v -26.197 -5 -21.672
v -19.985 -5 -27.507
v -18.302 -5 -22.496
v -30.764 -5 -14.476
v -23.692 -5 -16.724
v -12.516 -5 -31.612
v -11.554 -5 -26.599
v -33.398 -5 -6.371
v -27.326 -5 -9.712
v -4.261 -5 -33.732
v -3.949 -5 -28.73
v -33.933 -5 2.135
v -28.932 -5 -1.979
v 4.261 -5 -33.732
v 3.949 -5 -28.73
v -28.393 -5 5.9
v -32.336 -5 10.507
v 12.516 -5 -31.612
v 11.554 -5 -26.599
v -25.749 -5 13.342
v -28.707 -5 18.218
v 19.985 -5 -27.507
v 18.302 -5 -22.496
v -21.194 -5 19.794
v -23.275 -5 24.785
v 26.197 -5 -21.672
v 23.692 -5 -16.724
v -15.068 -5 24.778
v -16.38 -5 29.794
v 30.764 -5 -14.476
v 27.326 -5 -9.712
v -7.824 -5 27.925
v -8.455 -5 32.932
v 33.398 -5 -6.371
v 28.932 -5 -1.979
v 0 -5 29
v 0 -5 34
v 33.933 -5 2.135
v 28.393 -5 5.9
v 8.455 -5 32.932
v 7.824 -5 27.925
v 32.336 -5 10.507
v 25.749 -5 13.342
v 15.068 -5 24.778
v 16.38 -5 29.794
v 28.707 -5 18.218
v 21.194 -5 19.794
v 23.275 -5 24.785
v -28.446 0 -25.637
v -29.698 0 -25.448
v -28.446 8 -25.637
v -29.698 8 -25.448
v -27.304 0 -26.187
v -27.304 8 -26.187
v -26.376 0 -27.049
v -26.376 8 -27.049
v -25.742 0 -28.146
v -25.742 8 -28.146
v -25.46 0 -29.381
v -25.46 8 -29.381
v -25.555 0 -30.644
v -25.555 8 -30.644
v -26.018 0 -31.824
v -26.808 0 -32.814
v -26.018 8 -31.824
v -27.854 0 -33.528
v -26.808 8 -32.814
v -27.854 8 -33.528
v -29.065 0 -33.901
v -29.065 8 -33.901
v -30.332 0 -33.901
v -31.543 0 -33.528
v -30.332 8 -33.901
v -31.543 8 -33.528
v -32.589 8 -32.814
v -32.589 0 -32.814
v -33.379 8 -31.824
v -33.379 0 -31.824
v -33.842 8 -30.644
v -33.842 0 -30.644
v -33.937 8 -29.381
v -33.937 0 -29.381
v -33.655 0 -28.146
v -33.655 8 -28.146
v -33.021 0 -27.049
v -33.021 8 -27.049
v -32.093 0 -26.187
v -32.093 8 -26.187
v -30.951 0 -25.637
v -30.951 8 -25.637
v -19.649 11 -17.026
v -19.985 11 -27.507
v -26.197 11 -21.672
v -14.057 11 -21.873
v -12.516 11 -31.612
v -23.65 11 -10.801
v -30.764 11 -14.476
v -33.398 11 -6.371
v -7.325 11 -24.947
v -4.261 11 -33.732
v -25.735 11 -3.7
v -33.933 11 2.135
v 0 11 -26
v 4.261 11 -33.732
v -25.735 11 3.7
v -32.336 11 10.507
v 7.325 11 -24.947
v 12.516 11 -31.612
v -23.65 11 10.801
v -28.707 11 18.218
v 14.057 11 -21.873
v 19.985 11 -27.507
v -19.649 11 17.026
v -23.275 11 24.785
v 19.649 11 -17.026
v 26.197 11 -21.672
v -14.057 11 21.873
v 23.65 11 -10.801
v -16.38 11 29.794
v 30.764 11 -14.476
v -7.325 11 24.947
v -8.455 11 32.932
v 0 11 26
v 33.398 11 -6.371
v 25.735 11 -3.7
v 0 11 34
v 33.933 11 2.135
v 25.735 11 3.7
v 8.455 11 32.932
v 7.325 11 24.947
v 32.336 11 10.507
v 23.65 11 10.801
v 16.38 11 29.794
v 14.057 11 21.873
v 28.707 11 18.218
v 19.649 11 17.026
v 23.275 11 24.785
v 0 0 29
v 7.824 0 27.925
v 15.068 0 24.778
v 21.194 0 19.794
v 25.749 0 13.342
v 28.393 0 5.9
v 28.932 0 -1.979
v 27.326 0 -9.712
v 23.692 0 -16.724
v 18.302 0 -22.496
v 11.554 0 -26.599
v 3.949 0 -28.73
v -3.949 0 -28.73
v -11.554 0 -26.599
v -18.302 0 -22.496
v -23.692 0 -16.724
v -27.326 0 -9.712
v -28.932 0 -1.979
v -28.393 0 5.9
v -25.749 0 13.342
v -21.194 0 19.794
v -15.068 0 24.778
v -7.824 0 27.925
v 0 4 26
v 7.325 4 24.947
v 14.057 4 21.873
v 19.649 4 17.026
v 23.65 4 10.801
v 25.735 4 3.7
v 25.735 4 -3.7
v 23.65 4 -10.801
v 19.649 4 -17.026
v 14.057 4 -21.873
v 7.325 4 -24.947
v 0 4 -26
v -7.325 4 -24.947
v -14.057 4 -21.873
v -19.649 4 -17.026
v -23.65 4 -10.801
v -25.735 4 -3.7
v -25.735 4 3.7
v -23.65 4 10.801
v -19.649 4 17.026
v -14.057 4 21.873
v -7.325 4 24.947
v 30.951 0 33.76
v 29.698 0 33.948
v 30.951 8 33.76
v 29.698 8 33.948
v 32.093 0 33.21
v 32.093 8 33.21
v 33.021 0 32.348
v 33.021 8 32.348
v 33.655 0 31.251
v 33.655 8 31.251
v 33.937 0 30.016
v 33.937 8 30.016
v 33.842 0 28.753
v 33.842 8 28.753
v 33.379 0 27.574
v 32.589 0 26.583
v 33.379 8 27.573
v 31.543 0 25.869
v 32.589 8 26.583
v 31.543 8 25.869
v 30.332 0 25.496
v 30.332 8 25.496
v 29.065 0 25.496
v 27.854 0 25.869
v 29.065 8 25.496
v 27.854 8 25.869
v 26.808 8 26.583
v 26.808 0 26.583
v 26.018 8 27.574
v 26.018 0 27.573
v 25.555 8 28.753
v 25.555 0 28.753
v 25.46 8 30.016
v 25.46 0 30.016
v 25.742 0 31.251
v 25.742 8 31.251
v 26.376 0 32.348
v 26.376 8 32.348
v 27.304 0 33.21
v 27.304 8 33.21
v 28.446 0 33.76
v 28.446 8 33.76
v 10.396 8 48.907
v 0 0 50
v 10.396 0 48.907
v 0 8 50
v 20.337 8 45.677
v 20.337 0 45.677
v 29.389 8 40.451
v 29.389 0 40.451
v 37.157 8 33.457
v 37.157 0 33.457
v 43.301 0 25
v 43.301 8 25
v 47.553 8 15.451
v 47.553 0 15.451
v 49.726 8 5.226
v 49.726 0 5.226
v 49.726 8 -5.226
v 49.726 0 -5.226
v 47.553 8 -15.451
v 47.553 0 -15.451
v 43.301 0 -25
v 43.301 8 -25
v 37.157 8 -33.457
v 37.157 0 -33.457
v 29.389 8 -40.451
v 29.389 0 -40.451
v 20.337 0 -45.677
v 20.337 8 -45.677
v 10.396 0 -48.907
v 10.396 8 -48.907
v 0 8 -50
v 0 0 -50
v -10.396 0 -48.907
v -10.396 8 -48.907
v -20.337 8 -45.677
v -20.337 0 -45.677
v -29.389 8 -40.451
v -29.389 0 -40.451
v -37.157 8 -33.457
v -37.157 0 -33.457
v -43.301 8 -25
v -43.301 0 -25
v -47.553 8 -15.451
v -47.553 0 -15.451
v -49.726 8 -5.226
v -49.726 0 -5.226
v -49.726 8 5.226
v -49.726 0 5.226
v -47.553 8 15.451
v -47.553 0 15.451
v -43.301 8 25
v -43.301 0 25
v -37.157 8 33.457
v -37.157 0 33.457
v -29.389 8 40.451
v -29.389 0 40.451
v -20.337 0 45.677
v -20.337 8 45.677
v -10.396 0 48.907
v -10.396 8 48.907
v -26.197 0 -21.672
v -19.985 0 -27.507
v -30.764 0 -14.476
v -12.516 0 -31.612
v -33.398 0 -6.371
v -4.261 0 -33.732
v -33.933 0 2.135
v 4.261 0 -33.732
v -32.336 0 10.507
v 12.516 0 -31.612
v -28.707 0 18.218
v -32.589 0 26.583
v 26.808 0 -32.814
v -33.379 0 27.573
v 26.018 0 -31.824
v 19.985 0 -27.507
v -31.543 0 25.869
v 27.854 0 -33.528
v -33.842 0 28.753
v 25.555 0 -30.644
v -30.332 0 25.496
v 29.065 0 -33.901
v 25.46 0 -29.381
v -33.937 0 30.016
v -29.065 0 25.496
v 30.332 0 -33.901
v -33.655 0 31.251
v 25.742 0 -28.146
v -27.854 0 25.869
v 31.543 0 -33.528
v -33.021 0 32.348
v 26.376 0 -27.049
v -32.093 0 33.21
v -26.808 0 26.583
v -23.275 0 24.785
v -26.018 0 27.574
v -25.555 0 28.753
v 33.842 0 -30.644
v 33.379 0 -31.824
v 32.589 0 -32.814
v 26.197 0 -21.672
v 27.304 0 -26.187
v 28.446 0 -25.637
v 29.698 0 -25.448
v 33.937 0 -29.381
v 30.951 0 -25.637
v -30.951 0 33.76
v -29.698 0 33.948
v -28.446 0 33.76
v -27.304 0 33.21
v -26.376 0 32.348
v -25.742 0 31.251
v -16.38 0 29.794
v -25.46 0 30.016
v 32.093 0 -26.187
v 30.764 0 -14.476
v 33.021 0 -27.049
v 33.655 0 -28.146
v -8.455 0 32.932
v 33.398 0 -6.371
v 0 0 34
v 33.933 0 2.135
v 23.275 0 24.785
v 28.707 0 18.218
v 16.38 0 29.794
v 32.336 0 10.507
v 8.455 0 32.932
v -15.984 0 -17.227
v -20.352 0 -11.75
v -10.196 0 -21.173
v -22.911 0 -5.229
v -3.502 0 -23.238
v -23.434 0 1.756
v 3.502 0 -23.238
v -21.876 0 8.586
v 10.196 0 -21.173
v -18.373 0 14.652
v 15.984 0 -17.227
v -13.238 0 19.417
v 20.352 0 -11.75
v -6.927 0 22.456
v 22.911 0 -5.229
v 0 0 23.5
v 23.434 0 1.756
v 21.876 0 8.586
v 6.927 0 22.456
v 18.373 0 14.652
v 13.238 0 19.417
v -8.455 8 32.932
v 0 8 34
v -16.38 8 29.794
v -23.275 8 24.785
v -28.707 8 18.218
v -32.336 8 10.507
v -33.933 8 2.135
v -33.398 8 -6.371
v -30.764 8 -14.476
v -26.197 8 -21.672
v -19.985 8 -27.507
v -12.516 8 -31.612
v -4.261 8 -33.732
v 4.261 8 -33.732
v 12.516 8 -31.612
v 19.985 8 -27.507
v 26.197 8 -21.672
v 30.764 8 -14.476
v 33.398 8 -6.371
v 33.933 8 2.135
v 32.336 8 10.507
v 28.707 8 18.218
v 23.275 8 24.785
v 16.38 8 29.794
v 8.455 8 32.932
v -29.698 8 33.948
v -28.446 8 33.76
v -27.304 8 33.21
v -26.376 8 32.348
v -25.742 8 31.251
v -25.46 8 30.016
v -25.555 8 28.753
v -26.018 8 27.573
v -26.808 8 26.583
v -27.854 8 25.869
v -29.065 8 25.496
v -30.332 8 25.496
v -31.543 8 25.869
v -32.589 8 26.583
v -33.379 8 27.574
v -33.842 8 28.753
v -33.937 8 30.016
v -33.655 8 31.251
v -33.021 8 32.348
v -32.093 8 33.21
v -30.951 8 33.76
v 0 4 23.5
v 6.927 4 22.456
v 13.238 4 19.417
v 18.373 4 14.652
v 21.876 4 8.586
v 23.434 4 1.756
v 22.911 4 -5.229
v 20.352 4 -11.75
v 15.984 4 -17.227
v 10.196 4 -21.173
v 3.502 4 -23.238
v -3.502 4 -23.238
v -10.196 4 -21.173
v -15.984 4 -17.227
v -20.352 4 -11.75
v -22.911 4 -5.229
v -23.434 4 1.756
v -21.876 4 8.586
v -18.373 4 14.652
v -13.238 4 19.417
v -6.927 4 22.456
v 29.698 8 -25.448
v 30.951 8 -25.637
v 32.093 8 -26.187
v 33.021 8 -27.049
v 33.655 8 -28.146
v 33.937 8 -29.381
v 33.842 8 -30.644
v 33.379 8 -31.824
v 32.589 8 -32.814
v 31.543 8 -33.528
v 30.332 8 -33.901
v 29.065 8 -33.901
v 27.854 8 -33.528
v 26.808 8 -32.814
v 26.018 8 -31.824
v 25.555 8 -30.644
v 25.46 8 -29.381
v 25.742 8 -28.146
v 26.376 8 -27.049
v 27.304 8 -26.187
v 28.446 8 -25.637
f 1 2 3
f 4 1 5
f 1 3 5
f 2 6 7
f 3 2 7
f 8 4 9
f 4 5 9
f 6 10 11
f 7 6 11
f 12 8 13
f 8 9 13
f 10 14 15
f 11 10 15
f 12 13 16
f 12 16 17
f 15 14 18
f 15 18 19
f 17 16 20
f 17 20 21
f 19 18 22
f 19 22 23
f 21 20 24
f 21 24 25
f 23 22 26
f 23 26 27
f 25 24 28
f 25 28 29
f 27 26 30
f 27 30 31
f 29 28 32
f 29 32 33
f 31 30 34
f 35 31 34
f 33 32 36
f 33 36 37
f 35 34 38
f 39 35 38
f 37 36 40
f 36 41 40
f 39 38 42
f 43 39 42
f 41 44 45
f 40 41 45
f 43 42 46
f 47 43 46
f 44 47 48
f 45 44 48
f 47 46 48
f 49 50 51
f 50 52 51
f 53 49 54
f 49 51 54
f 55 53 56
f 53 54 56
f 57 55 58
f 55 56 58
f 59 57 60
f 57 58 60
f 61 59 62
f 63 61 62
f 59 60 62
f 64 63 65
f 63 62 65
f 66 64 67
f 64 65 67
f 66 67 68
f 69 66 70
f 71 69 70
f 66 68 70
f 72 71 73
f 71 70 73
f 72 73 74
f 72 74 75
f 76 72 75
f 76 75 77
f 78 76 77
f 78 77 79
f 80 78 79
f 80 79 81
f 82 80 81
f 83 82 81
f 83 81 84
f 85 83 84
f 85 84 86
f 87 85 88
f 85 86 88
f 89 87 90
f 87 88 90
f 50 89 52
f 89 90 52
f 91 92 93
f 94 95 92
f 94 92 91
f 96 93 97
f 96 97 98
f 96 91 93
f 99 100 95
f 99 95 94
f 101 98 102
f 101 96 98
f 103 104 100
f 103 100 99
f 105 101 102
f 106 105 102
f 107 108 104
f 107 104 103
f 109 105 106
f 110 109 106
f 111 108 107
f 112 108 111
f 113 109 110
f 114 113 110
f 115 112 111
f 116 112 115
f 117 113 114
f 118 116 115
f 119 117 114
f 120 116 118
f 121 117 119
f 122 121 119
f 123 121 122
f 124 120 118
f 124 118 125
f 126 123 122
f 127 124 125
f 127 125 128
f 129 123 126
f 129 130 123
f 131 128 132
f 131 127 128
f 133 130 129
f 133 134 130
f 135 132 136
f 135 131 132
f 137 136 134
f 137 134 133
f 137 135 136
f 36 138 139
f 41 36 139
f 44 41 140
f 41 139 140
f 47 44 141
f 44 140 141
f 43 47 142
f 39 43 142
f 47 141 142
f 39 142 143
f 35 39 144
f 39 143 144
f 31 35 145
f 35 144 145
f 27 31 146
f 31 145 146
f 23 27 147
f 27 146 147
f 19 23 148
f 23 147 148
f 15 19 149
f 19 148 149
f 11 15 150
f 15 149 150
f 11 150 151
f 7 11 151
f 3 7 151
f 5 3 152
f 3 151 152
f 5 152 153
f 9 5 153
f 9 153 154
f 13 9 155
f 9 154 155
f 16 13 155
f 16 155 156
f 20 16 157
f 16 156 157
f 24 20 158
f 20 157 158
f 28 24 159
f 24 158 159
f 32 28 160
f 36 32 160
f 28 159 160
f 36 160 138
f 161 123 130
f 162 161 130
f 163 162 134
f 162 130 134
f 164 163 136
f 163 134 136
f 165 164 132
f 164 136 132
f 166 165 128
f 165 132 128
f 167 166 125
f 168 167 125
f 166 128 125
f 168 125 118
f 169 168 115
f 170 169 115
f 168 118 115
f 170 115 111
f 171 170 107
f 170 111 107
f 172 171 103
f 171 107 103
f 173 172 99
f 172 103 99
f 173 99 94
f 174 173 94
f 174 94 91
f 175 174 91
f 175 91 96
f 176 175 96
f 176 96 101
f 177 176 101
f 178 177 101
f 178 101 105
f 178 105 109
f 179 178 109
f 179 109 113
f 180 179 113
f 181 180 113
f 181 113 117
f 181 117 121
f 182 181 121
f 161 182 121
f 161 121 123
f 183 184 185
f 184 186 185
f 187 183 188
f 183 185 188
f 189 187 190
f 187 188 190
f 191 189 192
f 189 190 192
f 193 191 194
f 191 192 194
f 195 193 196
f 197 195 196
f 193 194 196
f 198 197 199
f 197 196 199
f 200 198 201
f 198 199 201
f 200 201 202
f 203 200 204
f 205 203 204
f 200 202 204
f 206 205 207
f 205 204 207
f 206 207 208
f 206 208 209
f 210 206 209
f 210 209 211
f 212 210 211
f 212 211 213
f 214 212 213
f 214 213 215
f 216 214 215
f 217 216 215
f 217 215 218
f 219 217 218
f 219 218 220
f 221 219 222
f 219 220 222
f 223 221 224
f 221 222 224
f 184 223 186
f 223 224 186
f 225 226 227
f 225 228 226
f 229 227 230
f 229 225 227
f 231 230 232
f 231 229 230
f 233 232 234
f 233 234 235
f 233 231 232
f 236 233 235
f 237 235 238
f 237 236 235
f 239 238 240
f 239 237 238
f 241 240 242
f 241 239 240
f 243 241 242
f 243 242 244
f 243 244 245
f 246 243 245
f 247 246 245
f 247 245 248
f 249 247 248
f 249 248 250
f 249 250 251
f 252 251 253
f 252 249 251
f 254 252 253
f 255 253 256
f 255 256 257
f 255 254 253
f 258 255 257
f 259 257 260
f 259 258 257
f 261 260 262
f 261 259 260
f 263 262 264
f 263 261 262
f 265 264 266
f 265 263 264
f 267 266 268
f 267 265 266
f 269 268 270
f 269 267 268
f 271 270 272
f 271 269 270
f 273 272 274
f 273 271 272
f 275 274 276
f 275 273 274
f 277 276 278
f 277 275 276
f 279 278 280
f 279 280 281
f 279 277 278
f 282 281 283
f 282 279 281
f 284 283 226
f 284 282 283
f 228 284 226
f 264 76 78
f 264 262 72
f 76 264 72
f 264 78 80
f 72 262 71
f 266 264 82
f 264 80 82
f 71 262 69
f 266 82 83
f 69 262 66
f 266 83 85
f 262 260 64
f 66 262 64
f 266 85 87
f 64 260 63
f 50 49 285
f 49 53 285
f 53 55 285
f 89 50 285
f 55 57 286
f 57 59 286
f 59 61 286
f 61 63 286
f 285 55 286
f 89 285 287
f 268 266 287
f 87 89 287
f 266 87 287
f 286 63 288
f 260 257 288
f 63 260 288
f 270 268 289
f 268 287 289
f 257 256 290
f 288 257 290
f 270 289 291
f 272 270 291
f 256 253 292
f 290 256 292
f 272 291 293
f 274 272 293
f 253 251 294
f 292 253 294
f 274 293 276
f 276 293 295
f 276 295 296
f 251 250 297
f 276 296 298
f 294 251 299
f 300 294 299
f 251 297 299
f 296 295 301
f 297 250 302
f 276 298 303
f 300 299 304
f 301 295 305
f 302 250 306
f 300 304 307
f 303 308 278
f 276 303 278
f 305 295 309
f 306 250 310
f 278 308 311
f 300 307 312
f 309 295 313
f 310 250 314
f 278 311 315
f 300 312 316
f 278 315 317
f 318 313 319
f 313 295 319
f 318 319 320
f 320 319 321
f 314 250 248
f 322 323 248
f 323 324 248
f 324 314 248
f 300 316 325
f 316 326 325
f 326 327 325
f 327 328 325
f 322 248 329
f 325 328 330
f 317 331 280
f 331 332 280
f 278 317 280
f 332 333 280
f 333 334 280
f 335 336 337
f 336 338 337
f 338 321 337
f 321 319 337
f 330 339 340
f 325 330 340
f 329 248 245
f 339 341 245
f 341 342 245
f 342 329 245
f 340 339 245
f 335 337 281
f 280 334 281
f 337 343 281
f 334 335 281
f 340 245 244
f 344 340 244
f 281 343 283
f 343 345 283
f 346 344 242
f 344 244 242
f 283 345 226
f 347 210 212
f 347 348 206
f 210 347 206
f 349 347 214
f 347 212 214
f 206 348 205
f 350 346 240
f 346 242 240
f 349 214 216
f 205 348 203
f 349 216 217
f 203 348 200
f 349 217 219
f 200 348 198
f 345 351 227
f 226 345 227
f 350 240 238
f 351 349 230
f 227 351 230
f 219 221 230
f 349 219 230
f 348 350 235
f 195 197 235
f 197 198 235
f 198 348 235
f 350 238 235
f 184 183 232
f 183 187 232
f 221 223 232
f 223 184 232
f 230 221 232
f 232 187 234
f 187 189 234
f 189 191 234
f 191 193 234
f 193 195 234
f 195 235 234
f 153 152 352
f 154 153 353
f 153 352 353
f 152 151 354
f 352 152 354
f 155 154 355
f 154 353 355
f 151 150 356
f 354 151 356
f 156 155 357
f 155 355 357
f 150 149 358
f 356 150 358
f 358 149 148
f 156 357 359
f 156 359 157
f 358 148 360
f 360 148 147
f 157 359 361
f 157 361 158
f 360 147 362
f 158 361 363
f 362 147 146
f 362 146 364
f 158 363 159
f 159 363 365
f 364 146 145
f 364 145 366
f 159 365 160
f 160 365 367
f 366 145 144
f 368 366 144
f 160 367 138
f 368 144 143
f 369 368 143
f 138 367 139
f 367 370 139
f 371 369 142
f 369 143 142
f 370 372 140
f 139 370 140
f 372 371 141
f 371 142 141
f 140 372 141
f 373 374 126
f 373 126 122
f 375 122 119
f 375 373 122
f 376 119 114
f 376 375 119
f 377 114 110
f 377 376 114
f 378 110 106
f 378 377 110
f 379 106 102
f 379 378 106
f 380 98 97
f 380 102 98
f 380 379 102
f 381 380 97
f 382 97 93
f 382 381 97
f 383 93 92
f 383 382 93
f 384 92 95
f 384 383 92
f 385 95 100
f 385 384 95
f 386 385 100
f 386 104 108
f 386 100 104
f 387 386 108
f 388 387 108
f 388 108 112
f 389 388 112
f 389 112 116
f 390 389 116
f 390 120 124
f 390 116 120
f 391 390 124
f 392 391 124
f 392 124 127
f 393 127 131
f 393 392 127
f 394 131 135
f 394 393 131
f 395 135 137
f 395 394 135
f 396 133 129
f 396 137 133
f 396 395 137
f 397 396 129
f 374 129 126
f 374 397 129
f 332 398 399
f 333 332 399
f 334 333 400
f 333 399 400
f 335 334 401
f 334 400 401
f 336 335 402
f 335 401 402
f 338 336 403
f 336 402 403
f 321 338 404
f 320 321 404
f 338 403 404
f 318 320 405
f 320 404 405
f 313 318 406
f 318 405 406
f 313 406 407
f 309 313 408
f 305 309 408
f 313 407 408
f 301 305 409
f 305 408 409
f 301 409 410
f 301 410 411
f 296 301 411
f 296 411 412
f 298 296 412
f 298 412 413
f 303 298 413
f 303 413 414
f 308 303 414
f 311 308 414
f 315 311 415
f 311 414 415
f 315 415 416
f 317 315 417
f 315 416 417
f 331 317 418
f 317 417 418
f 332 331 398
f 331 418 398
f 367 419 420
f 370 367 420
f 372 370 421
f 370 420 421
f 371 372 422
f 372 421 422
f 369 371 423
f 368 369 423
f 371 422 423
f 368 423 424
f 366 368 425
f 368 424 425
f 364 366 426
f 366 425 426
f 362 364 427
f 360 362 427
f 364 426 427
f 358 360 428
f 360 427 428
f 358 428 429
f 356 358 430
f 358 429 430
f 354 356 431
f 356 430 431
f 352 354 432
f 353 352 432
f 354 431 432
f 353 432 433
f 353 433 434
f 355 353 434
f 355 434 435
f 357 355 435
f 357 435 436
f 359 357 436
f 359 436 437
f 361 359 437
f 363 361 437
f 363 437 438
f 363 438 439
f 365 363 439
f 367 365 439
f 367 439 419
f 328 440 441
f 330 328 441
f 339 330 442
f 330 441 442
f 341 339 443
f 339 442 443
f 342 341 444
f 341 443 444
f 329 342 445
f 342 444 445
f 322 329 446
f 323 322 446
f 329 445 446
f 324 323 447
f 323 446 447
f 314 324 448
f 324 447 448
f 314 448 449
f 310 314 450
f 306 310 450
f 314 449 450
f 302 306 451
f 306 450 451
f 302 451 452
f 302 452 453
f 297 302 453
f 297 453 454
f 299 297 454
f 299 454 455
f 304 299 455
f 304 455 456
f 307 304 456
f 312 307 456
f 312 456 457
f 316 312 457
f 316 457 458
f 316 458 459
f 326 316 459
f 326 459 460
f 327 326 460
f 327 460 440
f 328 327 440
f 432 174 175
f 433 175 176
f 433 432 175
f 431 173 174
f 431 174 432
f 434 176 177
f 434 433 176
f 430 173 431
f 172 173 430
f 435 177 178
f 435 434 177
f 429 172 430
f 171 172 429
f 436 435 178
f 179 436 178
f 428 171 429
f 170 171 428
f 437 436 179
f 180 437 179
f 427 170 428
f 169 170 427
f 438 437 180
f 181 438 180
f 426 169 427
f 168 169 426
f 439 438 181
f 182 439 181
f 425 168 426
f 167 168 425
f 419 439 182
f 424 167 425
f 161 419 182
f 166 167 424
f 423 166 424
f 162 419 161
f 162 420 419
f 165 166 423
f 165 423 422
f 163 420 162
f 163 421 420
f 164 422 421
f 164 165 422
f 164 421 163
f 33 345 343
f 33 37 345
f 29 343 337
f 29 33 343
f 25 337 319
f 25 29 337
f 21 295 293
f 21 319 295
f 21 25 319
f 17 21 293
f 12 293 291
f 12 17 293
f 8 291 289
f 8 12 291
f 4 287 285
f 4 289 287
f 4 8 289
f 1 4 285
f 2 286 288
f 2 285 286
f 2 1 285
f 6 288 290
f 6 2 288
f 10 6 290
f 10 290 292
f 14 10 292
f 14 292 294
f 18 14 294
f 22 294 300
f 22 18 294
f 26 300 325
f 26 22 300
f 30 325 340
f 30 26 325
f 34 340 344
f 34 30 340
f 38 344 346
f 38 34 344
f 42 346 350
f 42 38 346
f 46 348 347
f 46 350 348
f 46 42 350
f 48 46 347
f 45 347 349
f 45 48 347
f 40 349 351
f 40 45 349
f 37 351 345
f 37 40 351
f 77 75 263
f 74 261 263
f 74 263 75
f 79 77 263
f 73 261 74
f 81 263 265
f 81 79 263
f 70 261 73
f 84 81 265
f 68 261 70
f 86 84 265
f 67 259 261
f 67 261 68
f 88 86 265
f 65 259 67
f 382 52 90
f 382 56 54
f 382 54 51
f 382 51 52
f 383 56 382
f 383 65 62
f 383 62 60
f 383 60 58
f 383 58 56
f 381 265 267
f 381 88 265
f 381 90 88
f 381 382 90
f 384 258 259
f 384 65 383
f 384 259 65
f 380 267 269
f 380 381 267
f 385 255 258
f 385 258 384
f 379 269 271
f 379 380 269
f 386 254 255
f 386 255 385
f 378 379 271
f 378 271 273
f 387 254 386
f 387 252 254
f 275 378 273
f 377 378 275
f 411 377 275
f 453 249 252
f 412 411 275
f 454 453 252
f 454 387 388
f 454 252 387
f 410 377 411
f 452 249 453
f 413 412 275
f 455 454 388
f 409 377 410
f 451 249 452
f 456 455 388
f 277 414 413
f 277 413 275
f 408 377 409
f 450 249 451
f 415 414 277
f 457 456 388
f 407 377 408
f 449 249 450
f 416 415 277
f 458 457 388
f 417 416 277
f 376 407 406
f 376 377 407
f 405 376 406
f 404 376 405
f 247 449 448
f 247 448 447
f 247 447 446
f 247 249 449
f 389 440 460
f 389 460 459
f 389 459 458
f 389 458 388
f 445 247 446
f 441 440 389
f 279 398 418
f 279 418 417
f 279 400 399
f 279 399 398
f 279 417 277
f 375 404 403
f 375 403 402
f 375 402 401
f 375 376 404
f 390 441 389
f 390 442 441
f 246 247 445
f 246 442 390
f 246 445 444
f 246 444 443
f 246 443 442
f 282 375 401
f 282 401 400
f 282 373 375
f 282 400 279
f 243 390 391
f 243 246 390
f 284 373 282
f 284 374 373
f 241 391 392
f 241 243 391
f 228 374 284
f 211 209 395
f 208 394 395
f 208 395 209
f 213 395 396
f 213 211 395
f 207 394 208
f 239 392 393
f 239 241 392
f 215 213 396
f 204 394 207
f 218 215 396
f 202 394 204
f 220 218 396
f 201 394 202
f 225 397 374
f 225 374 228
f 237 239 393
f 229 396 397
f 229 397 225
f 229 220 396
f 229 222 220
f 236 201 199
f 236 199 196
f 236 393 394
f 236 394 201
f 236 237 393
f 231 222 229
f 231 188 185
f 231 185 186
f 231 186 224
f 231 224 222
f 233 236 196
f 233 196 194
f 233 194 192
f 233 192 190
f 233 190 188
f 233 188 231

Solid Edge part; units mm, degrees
sketch "Sketch1" plane through (0, 0, 0) normal (1, 0, 0) x (0, 1, 0)
  line L0 (8, 34) -> (8, 50)
  line L1 (0, 50) -> (8, 50)
  line L2 (0, 50) -> (0, 34)
  line L3 (0, 34) -> (-5, 34)
  line L4 (-5, 34) -> (-5, 29)
  line L5 (-5, 29) -> (0, 29)
  line L6 (0, 29) -> (0, 23.5)
  line L7 (0, 23.5) -> (4, 23.5)
  line L8 (4, 23.5) -> (4, 26)
  line L9 (4, 26) -> (11, 26)
  line L10 (11, 34) -> (11, 26)
  line L11 (11, 34) -> (8, 34)
revolve "RevolvedProtrusion1" add sketch "Sketch1" angle 360 about axis through (0, -22.1591, 0) along (0, 1, 0)
hole "Hole1" at (29.6985, 8, 29.6985) direction (0, -1, 0) diameter 8.5 end through all
hole "Hole2" at (-29.6985, 8, 29.6985) direction (0, -1, 0) diameter 8.5 end through all
hole "Hole3" at (-29.6985, 8, -29.6985) direction (0, -1, 0) diameter 8.5 end through all
hole "Hole4" at (29.6985, 8, -29.6985) direction (0, -1, 0) diameter 8.5 end through all
